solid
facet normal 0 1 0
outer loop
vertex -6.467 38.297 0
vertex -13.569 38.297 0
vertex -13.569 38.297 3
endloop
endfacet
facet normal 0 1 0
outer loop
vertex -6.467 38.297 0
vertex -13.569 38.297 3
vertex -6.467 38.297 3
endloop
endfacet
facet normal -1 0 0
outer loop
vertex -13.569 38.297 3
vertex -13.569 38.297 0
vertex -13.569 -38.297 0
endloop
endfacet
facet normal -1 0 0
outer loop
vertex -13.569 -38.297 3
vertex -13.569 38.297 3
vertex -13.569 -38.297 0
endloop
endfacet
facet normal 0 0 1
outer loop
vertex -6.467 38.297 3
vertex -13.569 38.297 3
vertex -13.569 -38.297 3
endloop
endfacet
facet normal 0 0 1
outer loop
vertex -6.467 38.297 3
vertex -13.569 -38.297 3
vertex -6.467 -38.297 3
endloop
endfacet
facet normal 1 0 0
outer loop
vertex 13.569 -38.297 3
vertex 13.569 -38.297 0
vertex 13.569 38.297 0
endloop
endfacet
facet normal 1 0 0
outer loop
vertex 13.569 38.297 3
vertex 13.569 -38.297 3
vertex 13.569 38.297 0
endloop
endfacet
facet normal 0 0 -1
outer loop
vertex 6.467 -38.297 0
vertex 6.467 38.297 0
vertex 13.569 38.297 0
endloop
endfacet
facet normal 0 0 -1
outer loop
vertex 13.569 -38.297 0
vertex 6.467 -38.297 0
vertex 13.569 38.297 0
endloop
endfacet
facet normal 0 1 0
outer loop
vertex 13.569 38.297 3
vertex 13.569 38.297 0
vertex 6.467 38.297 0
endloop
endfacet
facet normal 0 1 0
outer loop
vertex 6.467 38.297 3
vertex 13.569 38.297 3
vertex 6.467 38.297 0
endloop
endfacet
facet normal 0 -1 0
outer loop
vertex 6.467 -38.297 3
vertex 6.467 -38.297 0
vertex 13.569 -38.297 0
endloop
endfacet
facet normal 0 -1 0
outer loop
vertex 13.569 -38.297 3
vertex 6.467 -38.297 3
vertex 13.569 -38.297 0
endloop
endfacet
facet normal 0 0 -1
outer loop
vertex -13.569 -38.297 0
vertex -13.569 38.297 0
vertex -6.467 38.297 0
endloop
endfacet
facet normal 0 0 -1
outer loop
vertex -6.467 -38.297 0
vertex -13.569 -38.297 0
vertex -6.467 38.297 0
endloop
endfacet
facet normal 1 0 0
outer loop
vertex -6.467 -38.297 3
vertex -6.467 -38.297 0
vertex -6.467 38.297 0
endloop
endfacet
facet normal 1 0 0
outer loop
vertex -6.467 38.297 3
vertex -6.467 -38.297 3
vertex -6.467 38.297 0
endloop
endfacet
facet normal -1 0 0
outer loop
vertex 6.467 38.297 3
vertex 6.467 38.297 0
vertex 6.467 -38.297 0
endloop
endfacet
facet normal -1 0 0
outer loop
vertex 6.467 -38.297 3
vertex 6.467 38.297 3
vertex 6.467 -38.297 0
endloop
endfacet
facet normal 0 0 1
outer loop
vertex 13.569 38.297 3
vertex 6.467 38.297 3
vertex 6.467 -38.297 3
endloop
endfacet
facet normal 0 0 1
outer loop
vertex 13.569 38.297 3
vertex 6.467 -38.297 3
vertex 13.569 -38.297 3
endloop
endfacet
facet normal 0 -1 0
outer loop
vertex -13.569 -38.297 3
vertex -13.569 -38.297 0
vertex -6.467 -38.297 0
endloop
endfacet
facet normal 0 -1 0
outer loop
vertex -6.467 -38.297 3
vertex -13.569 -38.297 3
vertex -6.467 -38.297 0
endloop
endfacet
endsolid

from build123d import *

# Parameters (mm, degrees)
F0_W     = 7.101449
F0_H     = 38.297102
F1_DEPTH = 3


with BuildPart() as f1:
    # F0 (on Top) → F1 (new body)
    with BuildSketch(Plane.XY):
        with Locations((-10.018116, 19.148551)):
            Rectangle(F0_W, F0_H)
        with Locations((-10.018116, -19.148551)):
            Rectangle(F0_W, F0_H)
        Polygon((13.568841, 0), (13.568841, 38.297102), (6.467392, 38.297102), (6.467392, 0), (6.467392, -38.297102), (13.568841, -38.297102), align=None)
    extrude(amount=F1_DEPTH)


solid = f1.part
